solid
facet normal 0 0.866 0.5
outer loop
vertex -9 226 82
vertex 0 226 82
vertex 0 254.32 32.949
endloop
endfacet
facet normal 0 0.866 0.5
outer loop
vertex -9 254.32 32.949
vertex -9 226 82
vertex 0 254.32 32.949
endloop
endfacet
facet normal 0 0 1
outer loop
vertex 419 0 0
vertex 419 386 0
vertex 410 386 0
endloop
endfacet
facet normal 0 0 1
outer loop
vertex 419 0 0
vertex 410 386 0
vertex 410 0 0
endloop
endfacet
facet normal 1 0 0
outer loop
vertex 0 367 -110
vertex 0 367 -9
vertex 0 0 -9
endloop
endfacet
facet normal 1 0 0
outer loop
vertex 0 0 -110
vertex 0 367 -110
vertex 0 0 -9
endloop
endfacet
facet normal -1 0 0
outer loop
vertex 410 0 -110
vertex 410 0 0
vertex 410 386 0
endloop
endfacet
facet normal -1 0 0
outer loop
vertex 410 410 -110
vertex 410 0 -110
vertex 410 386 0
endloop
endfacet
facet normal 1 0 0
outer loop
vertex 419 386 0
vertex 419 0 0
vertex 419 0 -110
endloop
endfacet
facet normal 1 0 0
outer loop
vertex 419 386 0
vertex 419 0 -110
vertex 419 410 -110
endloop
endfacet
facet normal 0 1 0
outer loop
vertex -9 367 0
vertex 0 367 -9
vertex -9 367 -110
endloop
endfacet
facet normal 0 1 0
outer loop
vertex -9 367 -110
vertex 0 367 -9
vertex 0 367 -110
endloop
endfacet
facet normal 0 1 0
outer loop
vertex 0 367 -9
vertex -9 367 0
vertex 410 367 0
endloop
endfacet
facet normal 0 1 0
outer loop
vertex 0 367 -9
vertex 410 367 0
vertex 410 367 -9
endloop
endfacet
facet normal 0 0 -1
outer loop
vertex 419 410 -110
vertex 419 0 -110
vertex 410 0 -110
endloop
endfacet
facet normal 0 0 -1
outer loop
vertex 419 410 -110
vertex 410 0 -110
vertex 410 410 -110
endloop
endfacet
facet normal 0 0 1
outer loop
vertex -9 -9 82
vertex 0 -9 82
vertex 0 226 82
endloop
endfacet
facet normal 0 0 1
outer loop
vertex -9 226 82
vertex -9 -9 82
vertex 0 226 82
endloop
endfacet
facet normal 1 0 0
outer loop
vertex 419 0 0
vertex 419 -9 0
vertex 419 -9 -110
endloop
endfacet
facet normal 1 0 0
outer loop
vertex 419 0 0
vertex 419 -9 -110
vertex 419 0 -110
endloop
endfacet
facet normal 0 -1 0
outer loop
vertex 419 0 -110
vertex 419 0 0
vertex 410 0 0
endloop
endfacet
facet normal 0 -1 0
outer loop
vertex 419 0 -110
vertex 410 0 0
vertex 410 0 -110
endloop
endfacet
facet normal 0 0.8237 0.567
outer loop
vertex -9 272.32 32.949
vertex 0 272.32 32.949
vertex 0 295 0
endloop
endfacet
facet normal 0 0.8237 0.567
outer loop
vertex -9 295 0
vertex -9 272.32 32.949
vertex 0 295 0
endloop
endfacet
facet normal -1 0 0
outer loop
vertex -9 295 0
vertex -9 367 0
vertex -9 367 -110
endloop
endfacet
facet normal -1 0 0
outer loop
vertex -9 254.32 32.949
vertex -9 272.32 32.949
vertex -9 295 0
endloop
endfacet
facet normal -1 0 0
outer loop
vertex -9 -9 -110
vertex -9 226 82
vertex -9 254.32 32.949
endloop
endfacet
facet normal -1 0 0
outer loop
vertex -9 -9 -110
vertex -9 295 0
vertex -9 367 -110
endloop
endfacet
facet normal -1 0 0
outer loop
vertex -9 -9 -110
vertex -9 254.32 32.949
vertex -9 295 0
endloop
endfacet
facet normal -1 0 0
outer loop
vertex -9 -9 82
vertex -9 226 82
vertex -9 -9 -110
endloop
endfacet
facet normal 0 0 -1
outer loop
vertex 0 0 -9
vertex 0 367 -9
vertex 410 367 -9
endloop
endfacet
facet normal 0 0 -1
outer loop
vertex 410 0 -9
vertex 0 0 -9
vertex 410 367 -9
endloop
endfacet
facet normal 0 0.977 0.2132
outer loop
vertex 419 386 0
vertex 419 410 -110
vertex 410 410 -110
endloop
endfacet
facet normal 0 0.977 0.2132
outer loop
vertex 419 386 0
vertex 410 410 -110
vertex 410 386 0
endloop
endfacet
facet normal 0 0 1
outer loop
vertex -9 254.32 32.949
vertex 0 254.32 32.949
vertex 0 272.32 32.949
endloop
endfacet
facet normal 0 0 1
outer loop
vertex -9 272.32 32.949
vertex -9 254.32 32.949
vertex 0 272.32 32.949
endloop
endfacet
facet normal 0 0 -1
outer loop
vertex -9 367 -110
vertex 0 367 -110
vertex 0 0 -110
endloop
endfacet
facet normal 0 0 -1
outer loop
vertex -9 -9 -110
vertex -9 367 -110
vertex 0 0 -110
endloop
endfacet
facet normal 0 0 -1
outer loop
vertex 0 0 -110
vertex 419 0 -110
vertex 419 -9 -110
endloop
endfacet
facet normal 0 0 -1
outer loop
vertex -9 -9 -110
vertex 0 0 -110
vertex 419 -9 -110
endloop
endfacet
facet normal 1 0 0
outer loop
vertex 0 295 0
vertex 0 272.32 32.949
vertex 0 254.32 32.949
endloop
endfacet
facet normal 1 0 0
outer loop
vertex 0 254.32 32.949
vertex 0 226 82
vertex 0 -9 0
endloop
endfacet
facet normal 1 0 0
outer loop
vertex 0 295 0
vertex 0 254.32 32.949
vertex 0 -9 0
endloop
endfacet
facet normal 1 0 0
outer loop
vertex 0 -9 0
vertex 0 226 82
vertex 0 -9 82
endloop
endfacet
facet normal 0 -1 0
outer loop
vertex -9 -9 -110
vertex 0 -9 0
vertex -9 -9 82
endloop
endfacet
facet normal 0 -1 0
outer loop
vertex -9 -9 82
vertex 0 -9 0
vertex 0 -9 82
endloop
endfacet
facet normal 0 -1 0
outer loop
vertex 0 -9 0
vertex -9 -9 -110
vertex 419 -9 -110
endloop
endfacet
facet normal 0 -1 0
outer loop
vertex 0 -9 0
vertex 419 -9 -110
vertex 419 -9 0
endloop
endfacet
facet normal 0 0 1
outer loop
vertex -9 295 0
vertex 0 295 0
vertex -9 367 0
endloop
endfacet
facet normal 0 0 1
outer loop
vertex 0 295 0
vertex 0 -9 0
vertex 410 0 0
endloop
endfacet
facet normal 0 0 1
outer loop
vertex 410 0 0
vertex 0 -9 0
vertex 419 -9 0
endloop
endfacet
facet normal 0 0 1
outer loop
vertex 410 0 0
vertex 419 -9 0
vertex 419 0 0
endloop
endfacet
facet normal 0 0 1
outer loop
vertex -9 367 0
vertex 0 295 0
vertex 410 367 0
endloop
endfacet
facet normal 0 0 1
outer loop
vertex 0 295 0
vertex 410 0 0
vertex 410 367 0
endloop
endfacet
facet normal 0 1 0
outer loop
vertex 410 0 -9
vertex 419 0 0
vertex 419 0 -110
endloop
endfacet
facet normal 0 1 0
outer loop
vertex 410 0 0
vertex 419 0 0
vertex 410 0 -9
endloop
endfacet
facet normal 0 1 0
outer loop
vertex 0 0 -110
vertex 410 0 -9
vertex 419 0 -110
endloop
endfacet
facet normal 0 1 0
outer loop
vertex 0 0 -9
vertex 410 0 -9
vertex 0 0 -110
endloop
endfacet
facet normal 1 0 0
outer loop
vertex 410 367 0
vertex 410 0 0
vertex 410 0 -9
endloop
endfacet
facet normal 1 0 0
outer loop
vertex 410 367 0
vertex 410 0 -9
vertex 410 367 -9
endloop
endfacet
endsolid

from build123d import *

# Parameters (mm, degrees)
F0_W     = 410
F0_H     = 367
F1_DEPTH = 9
F2_DEPTH = 110
F4_DEPTH = 9
F6_DEPTH = 9


with BuildPart() as f1:
    # F0 (on Top) → F1 (new body)
    with BuildSketch(Plane.XY):
        with Locations((205, 183.5)):
            Rectangle(F0_W, F0_H)
    extrude(amount=-F1_DEPTH)

    # F0 (on Top) → F2 (join)
    with BuildSketch(Plane.XY):
        Polygon((410, 0), (0, 0), (0, -9), (419, -9), (419, 0), align=None)
    extrude(amount=-F2_DEPTH)

    # F5 (on face) → F6 (join)
    with BuildSketch(Plane(origin=(0, 0, 0), x_dir=(0, -1, 0), z_dir=(-1, 0, 0))):
        Polygon((-367, -110), (9, -110), (9, 82), (-226, 82), (-254.319839, 32.948601), (-272.319839, 32.948601), (-295, 0), (-367, 0), align=None)
    extrude(amount=F6_DEPTH)


with BuildPart() as f4:
    # F3 (on face) → F4 (new body)
    with BuildSketch(Plane.YZ.offset(419)):
        Polygon((386, 0), (0, 0), (0, -110), (410, -110), align=None)
    extrude(amount=-F4_DEPTH)


solid = Compound([f1.part, f4.part])
